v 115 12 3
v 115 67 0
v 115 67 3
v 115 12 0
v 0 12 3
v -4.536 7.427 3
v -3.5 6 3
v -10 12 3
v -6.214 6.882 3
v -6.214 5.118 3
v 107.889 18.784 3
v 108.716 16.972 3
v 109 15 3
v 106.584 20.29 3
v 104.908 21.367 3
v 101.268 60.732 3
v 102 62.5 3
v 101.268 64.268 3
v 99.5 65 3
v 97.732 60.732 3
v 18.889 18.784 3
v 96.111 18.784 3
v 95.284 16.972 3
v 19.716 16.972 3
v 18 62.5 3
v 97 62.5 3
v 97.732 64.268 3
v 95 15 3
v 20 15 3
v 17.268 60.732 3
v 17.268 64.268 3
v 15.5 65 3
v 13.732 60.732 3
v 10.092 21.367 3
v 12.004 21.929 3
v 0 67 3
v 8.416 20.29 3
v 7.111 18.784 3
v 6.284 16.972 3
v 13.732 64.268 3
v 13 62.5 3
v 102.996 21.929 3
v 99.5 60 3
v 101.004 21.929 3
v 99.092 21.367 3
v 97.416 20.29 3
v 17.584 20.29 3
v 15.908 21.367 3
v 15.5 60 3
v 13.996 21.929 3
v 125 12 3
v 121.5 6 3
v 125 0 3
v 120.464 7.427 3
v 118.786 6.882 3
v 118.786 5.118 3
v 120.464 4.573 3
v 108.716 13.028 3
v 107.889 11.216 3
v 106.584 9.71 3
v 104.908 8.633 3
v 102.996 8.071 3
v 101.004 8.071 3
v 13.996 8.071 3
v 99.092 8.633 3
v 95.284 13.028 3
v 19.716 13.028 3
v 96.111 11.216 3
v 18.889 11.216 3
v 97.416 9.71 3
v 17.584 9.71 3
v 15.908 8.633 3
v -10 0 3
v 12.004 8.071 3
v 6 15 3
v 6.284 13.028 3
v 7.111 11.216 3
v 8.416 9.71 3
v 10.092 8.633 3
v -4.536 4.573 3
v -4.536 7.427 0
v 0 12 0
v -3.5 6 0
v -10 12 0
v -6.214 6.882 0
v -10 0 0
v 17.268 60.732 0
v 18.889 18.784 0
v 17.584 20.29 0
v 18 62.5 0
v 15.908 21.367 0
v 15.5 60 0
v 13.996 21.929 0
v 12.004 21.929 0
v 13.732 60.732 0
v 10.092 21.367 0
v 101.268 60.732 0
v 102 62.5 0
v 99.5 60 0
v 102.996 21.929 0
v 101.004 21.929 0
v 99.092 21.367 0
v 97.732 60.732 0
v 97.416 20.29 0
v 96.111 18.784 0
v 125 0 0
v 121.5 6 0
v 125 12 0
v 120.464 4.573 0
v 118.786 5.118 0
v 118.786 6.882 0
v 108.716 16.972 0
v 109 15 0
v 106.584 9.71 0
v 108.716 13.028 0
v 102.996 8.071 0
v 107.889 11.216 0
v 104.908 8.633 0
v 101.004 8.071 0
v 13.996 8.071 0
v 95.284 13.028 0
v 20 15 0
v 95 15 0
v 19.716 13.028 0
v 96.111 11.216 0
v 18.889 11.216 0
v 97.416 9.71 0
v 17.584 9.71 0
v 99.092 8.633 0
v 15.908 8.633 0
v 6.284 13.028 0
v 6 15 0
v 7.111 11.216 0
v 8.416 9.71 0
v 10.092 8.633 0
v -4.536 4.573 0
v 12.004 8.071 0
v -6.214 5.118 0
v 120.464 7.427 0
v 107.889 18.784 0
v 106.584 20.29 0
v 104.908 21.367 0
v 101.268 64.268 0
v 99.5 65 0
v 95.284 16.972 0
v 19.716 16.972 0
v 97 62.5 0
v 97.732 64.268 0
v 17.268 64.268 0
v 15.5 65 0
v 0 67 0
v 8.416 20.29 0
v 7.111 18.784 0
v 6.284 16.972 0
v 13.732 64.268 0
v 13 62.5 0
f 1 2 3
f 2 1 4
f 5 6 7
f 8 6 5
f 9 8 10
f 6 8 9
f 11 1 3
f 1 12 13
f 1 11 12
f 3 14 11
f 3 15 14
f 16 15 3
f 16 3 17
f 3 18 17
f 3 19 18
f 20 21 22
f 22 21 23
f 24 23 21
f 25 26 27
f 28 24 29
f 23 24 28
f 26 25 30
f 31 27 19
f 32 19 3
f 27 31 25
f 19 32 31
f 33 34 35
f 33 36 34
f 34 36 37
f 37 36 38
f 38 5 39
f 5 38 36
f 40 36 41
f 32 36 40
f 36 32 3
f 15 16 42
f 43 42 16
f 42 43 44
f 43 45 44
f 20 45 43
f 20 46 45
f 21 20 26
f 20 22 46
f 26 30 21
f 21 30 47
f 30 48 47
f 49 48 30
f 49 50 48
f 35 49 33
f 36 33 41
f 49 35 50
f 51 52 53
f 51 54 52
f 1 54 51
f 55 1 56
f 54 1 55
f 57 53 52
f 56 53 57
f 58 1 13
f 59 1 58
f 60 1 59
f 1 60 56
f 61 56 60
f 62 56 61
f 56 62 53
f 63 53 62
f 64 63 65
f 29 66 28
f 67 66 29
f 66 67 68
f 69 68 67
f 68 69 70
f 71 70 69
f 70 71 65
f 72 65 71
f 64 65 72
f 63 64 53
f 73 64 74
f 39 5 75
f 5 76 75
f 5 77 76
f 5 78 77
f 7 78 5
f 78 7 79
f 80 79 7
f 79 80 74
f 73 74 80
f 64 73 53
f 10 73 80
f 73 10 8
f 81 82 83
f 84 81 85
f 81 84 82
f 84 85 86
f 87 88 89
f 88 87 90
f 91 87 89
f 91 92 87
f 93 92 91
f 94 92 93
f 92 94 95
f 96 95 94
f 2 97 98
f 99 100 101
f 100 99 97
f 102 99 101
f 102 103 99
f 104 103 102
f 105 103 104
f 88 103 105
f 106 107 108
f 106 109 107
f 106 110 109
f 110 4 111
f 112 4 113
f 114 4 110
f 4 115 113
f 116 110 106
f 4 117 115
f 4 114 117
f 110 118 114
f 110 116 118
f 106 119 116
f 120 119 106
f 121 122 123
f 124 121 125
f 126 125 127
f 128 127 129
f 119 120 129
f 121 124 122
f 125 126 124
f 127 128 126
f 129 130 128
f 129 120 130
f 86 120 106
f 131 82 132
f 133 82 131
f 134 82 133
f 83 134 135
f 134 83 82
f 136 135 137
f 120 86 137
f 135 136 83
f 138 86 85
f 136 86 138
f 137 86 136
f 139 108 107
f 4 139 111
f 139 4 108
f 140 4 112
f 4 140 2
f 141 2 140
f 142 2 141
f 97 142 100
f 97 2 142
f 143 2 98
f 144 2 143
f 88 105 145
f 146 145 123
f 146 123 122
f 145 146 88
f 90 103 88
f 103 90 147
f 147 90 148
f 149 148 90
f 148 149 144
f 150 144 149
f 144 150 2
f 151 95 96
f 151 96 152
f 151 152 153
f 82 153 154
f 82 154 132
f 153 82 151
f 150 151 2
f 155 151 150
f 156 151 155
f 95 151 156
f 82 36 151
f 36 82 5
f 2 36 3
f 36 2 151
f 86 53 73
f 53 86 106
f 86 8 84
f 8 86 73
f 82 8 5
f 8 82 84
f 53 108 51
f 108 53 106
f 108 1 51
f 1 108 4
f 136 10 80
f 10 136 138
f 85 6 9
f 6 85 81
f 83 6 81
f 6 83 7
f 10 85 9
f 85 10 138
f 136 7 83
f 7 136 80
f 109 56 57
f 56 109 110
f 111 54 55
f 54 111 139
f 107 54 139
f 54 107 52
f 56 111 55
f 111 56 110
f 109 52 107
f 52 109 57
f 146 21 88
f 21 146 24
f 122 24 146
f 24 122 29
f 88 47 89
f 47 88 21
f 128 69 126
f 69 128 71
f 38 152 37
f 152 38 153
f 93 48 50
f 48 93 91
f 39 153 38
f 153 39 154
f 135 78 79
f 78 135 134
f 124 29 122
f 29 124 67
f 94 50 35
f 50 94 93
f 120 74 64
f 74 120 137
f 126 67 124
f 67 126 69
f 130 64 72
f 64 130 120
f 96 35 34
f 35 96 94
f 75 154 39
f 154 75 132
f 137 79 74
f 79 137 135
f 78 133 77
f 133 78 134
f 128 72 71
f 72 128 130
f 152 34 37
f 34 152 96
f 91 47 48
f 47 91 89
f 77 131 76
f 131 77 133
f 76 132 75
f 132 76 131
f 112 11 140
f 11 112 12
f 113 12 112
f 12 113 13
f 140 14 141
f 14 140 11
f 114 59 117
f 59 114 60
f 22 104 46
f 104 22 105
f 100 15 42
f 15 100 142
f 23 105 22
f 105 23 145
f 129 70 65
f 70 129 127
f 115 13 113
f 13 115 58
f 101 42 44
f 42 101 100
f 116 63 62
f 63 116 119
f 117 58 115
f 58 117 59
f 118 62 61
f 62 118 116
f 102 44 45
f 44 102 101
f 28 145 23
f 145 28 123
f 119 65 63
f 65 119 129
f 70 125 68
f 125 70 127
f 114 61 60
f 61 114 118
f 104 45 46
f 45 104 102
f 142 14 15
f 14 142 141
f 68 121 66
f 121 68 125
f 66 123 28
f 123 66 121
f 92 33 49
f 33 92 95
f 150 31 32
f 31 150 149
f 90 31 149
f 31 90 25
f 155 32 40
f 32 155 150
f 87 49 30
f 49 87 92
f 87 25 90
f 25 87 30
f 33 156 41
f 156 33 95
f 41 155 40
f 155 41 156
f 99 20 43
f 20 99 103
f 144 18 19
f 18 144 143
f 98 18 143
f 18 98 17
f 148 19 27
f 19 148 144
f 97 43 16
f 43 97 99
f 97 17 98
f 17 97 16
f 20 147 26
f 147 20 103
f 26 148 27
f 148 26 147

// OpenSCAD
h1 = 19;
h2 = 23;
w = 15;
l = 50;
oh = 15;
nh = 3;
r = 3/2;

module clamp(h, w, t, oh, l, nh, r){
    difference(){
        union(){
            cube([l, w, h]);
            translate([0,0,h]){
                cube([l, w+oh, t]);
            }
        }
        s = l/(nh+1);
        for(i=[1:nh]){
            translate([s*i,w/2,0]) cylinder(h+t, r, r);
        }
    }
}


module nucClamp(){
    //cube([115, 65, 3]);
    difference(){
        union(){
            cube([115, 50, 19]);
            translate([-10,0,0]) cube([10, 50-38, 55]);
            translate([115,0,0]) cube([10, 50-38, 55]);
        }
            translate([-5,6,35]) cylinder(100,r,r);
            translate([120,6,35])cylinder(100,r,r); 
        nh = 5;
        s = 115/(nh+1);
        for(i=[1:nh]){
                translate([s*i,50-w/2,0]) cylinder(100, r, r);
        }
        
        translate([25,18,0]) cylinder(100, 5, 5);
        translate([36,18,0]) cylinder(100, 4, 4);
    }
    
}

module nucPlate(){
    difference(){
        union(){
            cube([115, 65+2, 3]);
            translate([-10,0,0]) cube([10, 50-38, 3]);
            translate([115,0,0]) cube([10, 50-38, 3]);
        }
            translate([-5,6,0]) cylinder(100,r,r);
            translate([120,6,0])cylinder(100,r,r); 
        
        d1 = 13;
        translate([d1,15,0]) cylinder(100,7,7);
        translate([115-d1,15,0])cylinder(100,7,7); 
        d2 = 15.5;
        translate([d2,15+47.5,0]) cylinder(100,2.5,2.5);
        translate([115-d2,15+47.5,0])cylinder(100,2.5,2.5); 
    }
    
}

module nucClampDrillGuides(){
    difference(){
        cylinder(20, 4.2, 4.2);
        cylinder(20, 3/2, 3/2);
    }
    
    translate([12,0,0])
    difference(){
        cylinder(20, 3.2, 3.2);
        cylinder(20, 3/2, 3/2);
    }
}

module buttonGuide(){
        nh = 6;
        s = 75/(nh-1);
        r=3;
        difference(){
        translate([-15/2,0,0])cube([90,15,3]);
        for(i=[1:nh]){
                translate([s*(i-1),7,0]) cylinder(20, 3, 3);
        }
    }
        translate([s*4+1.5*2-0.5,-10,0])cube([10,10,3]);
}

//buttonGuide();
//nucClampDrillGuides();

//rotate([180,0,0]) clamp(h2, w, 5, oh, l, nh, r);
//nucClamp();
nucPlate();
